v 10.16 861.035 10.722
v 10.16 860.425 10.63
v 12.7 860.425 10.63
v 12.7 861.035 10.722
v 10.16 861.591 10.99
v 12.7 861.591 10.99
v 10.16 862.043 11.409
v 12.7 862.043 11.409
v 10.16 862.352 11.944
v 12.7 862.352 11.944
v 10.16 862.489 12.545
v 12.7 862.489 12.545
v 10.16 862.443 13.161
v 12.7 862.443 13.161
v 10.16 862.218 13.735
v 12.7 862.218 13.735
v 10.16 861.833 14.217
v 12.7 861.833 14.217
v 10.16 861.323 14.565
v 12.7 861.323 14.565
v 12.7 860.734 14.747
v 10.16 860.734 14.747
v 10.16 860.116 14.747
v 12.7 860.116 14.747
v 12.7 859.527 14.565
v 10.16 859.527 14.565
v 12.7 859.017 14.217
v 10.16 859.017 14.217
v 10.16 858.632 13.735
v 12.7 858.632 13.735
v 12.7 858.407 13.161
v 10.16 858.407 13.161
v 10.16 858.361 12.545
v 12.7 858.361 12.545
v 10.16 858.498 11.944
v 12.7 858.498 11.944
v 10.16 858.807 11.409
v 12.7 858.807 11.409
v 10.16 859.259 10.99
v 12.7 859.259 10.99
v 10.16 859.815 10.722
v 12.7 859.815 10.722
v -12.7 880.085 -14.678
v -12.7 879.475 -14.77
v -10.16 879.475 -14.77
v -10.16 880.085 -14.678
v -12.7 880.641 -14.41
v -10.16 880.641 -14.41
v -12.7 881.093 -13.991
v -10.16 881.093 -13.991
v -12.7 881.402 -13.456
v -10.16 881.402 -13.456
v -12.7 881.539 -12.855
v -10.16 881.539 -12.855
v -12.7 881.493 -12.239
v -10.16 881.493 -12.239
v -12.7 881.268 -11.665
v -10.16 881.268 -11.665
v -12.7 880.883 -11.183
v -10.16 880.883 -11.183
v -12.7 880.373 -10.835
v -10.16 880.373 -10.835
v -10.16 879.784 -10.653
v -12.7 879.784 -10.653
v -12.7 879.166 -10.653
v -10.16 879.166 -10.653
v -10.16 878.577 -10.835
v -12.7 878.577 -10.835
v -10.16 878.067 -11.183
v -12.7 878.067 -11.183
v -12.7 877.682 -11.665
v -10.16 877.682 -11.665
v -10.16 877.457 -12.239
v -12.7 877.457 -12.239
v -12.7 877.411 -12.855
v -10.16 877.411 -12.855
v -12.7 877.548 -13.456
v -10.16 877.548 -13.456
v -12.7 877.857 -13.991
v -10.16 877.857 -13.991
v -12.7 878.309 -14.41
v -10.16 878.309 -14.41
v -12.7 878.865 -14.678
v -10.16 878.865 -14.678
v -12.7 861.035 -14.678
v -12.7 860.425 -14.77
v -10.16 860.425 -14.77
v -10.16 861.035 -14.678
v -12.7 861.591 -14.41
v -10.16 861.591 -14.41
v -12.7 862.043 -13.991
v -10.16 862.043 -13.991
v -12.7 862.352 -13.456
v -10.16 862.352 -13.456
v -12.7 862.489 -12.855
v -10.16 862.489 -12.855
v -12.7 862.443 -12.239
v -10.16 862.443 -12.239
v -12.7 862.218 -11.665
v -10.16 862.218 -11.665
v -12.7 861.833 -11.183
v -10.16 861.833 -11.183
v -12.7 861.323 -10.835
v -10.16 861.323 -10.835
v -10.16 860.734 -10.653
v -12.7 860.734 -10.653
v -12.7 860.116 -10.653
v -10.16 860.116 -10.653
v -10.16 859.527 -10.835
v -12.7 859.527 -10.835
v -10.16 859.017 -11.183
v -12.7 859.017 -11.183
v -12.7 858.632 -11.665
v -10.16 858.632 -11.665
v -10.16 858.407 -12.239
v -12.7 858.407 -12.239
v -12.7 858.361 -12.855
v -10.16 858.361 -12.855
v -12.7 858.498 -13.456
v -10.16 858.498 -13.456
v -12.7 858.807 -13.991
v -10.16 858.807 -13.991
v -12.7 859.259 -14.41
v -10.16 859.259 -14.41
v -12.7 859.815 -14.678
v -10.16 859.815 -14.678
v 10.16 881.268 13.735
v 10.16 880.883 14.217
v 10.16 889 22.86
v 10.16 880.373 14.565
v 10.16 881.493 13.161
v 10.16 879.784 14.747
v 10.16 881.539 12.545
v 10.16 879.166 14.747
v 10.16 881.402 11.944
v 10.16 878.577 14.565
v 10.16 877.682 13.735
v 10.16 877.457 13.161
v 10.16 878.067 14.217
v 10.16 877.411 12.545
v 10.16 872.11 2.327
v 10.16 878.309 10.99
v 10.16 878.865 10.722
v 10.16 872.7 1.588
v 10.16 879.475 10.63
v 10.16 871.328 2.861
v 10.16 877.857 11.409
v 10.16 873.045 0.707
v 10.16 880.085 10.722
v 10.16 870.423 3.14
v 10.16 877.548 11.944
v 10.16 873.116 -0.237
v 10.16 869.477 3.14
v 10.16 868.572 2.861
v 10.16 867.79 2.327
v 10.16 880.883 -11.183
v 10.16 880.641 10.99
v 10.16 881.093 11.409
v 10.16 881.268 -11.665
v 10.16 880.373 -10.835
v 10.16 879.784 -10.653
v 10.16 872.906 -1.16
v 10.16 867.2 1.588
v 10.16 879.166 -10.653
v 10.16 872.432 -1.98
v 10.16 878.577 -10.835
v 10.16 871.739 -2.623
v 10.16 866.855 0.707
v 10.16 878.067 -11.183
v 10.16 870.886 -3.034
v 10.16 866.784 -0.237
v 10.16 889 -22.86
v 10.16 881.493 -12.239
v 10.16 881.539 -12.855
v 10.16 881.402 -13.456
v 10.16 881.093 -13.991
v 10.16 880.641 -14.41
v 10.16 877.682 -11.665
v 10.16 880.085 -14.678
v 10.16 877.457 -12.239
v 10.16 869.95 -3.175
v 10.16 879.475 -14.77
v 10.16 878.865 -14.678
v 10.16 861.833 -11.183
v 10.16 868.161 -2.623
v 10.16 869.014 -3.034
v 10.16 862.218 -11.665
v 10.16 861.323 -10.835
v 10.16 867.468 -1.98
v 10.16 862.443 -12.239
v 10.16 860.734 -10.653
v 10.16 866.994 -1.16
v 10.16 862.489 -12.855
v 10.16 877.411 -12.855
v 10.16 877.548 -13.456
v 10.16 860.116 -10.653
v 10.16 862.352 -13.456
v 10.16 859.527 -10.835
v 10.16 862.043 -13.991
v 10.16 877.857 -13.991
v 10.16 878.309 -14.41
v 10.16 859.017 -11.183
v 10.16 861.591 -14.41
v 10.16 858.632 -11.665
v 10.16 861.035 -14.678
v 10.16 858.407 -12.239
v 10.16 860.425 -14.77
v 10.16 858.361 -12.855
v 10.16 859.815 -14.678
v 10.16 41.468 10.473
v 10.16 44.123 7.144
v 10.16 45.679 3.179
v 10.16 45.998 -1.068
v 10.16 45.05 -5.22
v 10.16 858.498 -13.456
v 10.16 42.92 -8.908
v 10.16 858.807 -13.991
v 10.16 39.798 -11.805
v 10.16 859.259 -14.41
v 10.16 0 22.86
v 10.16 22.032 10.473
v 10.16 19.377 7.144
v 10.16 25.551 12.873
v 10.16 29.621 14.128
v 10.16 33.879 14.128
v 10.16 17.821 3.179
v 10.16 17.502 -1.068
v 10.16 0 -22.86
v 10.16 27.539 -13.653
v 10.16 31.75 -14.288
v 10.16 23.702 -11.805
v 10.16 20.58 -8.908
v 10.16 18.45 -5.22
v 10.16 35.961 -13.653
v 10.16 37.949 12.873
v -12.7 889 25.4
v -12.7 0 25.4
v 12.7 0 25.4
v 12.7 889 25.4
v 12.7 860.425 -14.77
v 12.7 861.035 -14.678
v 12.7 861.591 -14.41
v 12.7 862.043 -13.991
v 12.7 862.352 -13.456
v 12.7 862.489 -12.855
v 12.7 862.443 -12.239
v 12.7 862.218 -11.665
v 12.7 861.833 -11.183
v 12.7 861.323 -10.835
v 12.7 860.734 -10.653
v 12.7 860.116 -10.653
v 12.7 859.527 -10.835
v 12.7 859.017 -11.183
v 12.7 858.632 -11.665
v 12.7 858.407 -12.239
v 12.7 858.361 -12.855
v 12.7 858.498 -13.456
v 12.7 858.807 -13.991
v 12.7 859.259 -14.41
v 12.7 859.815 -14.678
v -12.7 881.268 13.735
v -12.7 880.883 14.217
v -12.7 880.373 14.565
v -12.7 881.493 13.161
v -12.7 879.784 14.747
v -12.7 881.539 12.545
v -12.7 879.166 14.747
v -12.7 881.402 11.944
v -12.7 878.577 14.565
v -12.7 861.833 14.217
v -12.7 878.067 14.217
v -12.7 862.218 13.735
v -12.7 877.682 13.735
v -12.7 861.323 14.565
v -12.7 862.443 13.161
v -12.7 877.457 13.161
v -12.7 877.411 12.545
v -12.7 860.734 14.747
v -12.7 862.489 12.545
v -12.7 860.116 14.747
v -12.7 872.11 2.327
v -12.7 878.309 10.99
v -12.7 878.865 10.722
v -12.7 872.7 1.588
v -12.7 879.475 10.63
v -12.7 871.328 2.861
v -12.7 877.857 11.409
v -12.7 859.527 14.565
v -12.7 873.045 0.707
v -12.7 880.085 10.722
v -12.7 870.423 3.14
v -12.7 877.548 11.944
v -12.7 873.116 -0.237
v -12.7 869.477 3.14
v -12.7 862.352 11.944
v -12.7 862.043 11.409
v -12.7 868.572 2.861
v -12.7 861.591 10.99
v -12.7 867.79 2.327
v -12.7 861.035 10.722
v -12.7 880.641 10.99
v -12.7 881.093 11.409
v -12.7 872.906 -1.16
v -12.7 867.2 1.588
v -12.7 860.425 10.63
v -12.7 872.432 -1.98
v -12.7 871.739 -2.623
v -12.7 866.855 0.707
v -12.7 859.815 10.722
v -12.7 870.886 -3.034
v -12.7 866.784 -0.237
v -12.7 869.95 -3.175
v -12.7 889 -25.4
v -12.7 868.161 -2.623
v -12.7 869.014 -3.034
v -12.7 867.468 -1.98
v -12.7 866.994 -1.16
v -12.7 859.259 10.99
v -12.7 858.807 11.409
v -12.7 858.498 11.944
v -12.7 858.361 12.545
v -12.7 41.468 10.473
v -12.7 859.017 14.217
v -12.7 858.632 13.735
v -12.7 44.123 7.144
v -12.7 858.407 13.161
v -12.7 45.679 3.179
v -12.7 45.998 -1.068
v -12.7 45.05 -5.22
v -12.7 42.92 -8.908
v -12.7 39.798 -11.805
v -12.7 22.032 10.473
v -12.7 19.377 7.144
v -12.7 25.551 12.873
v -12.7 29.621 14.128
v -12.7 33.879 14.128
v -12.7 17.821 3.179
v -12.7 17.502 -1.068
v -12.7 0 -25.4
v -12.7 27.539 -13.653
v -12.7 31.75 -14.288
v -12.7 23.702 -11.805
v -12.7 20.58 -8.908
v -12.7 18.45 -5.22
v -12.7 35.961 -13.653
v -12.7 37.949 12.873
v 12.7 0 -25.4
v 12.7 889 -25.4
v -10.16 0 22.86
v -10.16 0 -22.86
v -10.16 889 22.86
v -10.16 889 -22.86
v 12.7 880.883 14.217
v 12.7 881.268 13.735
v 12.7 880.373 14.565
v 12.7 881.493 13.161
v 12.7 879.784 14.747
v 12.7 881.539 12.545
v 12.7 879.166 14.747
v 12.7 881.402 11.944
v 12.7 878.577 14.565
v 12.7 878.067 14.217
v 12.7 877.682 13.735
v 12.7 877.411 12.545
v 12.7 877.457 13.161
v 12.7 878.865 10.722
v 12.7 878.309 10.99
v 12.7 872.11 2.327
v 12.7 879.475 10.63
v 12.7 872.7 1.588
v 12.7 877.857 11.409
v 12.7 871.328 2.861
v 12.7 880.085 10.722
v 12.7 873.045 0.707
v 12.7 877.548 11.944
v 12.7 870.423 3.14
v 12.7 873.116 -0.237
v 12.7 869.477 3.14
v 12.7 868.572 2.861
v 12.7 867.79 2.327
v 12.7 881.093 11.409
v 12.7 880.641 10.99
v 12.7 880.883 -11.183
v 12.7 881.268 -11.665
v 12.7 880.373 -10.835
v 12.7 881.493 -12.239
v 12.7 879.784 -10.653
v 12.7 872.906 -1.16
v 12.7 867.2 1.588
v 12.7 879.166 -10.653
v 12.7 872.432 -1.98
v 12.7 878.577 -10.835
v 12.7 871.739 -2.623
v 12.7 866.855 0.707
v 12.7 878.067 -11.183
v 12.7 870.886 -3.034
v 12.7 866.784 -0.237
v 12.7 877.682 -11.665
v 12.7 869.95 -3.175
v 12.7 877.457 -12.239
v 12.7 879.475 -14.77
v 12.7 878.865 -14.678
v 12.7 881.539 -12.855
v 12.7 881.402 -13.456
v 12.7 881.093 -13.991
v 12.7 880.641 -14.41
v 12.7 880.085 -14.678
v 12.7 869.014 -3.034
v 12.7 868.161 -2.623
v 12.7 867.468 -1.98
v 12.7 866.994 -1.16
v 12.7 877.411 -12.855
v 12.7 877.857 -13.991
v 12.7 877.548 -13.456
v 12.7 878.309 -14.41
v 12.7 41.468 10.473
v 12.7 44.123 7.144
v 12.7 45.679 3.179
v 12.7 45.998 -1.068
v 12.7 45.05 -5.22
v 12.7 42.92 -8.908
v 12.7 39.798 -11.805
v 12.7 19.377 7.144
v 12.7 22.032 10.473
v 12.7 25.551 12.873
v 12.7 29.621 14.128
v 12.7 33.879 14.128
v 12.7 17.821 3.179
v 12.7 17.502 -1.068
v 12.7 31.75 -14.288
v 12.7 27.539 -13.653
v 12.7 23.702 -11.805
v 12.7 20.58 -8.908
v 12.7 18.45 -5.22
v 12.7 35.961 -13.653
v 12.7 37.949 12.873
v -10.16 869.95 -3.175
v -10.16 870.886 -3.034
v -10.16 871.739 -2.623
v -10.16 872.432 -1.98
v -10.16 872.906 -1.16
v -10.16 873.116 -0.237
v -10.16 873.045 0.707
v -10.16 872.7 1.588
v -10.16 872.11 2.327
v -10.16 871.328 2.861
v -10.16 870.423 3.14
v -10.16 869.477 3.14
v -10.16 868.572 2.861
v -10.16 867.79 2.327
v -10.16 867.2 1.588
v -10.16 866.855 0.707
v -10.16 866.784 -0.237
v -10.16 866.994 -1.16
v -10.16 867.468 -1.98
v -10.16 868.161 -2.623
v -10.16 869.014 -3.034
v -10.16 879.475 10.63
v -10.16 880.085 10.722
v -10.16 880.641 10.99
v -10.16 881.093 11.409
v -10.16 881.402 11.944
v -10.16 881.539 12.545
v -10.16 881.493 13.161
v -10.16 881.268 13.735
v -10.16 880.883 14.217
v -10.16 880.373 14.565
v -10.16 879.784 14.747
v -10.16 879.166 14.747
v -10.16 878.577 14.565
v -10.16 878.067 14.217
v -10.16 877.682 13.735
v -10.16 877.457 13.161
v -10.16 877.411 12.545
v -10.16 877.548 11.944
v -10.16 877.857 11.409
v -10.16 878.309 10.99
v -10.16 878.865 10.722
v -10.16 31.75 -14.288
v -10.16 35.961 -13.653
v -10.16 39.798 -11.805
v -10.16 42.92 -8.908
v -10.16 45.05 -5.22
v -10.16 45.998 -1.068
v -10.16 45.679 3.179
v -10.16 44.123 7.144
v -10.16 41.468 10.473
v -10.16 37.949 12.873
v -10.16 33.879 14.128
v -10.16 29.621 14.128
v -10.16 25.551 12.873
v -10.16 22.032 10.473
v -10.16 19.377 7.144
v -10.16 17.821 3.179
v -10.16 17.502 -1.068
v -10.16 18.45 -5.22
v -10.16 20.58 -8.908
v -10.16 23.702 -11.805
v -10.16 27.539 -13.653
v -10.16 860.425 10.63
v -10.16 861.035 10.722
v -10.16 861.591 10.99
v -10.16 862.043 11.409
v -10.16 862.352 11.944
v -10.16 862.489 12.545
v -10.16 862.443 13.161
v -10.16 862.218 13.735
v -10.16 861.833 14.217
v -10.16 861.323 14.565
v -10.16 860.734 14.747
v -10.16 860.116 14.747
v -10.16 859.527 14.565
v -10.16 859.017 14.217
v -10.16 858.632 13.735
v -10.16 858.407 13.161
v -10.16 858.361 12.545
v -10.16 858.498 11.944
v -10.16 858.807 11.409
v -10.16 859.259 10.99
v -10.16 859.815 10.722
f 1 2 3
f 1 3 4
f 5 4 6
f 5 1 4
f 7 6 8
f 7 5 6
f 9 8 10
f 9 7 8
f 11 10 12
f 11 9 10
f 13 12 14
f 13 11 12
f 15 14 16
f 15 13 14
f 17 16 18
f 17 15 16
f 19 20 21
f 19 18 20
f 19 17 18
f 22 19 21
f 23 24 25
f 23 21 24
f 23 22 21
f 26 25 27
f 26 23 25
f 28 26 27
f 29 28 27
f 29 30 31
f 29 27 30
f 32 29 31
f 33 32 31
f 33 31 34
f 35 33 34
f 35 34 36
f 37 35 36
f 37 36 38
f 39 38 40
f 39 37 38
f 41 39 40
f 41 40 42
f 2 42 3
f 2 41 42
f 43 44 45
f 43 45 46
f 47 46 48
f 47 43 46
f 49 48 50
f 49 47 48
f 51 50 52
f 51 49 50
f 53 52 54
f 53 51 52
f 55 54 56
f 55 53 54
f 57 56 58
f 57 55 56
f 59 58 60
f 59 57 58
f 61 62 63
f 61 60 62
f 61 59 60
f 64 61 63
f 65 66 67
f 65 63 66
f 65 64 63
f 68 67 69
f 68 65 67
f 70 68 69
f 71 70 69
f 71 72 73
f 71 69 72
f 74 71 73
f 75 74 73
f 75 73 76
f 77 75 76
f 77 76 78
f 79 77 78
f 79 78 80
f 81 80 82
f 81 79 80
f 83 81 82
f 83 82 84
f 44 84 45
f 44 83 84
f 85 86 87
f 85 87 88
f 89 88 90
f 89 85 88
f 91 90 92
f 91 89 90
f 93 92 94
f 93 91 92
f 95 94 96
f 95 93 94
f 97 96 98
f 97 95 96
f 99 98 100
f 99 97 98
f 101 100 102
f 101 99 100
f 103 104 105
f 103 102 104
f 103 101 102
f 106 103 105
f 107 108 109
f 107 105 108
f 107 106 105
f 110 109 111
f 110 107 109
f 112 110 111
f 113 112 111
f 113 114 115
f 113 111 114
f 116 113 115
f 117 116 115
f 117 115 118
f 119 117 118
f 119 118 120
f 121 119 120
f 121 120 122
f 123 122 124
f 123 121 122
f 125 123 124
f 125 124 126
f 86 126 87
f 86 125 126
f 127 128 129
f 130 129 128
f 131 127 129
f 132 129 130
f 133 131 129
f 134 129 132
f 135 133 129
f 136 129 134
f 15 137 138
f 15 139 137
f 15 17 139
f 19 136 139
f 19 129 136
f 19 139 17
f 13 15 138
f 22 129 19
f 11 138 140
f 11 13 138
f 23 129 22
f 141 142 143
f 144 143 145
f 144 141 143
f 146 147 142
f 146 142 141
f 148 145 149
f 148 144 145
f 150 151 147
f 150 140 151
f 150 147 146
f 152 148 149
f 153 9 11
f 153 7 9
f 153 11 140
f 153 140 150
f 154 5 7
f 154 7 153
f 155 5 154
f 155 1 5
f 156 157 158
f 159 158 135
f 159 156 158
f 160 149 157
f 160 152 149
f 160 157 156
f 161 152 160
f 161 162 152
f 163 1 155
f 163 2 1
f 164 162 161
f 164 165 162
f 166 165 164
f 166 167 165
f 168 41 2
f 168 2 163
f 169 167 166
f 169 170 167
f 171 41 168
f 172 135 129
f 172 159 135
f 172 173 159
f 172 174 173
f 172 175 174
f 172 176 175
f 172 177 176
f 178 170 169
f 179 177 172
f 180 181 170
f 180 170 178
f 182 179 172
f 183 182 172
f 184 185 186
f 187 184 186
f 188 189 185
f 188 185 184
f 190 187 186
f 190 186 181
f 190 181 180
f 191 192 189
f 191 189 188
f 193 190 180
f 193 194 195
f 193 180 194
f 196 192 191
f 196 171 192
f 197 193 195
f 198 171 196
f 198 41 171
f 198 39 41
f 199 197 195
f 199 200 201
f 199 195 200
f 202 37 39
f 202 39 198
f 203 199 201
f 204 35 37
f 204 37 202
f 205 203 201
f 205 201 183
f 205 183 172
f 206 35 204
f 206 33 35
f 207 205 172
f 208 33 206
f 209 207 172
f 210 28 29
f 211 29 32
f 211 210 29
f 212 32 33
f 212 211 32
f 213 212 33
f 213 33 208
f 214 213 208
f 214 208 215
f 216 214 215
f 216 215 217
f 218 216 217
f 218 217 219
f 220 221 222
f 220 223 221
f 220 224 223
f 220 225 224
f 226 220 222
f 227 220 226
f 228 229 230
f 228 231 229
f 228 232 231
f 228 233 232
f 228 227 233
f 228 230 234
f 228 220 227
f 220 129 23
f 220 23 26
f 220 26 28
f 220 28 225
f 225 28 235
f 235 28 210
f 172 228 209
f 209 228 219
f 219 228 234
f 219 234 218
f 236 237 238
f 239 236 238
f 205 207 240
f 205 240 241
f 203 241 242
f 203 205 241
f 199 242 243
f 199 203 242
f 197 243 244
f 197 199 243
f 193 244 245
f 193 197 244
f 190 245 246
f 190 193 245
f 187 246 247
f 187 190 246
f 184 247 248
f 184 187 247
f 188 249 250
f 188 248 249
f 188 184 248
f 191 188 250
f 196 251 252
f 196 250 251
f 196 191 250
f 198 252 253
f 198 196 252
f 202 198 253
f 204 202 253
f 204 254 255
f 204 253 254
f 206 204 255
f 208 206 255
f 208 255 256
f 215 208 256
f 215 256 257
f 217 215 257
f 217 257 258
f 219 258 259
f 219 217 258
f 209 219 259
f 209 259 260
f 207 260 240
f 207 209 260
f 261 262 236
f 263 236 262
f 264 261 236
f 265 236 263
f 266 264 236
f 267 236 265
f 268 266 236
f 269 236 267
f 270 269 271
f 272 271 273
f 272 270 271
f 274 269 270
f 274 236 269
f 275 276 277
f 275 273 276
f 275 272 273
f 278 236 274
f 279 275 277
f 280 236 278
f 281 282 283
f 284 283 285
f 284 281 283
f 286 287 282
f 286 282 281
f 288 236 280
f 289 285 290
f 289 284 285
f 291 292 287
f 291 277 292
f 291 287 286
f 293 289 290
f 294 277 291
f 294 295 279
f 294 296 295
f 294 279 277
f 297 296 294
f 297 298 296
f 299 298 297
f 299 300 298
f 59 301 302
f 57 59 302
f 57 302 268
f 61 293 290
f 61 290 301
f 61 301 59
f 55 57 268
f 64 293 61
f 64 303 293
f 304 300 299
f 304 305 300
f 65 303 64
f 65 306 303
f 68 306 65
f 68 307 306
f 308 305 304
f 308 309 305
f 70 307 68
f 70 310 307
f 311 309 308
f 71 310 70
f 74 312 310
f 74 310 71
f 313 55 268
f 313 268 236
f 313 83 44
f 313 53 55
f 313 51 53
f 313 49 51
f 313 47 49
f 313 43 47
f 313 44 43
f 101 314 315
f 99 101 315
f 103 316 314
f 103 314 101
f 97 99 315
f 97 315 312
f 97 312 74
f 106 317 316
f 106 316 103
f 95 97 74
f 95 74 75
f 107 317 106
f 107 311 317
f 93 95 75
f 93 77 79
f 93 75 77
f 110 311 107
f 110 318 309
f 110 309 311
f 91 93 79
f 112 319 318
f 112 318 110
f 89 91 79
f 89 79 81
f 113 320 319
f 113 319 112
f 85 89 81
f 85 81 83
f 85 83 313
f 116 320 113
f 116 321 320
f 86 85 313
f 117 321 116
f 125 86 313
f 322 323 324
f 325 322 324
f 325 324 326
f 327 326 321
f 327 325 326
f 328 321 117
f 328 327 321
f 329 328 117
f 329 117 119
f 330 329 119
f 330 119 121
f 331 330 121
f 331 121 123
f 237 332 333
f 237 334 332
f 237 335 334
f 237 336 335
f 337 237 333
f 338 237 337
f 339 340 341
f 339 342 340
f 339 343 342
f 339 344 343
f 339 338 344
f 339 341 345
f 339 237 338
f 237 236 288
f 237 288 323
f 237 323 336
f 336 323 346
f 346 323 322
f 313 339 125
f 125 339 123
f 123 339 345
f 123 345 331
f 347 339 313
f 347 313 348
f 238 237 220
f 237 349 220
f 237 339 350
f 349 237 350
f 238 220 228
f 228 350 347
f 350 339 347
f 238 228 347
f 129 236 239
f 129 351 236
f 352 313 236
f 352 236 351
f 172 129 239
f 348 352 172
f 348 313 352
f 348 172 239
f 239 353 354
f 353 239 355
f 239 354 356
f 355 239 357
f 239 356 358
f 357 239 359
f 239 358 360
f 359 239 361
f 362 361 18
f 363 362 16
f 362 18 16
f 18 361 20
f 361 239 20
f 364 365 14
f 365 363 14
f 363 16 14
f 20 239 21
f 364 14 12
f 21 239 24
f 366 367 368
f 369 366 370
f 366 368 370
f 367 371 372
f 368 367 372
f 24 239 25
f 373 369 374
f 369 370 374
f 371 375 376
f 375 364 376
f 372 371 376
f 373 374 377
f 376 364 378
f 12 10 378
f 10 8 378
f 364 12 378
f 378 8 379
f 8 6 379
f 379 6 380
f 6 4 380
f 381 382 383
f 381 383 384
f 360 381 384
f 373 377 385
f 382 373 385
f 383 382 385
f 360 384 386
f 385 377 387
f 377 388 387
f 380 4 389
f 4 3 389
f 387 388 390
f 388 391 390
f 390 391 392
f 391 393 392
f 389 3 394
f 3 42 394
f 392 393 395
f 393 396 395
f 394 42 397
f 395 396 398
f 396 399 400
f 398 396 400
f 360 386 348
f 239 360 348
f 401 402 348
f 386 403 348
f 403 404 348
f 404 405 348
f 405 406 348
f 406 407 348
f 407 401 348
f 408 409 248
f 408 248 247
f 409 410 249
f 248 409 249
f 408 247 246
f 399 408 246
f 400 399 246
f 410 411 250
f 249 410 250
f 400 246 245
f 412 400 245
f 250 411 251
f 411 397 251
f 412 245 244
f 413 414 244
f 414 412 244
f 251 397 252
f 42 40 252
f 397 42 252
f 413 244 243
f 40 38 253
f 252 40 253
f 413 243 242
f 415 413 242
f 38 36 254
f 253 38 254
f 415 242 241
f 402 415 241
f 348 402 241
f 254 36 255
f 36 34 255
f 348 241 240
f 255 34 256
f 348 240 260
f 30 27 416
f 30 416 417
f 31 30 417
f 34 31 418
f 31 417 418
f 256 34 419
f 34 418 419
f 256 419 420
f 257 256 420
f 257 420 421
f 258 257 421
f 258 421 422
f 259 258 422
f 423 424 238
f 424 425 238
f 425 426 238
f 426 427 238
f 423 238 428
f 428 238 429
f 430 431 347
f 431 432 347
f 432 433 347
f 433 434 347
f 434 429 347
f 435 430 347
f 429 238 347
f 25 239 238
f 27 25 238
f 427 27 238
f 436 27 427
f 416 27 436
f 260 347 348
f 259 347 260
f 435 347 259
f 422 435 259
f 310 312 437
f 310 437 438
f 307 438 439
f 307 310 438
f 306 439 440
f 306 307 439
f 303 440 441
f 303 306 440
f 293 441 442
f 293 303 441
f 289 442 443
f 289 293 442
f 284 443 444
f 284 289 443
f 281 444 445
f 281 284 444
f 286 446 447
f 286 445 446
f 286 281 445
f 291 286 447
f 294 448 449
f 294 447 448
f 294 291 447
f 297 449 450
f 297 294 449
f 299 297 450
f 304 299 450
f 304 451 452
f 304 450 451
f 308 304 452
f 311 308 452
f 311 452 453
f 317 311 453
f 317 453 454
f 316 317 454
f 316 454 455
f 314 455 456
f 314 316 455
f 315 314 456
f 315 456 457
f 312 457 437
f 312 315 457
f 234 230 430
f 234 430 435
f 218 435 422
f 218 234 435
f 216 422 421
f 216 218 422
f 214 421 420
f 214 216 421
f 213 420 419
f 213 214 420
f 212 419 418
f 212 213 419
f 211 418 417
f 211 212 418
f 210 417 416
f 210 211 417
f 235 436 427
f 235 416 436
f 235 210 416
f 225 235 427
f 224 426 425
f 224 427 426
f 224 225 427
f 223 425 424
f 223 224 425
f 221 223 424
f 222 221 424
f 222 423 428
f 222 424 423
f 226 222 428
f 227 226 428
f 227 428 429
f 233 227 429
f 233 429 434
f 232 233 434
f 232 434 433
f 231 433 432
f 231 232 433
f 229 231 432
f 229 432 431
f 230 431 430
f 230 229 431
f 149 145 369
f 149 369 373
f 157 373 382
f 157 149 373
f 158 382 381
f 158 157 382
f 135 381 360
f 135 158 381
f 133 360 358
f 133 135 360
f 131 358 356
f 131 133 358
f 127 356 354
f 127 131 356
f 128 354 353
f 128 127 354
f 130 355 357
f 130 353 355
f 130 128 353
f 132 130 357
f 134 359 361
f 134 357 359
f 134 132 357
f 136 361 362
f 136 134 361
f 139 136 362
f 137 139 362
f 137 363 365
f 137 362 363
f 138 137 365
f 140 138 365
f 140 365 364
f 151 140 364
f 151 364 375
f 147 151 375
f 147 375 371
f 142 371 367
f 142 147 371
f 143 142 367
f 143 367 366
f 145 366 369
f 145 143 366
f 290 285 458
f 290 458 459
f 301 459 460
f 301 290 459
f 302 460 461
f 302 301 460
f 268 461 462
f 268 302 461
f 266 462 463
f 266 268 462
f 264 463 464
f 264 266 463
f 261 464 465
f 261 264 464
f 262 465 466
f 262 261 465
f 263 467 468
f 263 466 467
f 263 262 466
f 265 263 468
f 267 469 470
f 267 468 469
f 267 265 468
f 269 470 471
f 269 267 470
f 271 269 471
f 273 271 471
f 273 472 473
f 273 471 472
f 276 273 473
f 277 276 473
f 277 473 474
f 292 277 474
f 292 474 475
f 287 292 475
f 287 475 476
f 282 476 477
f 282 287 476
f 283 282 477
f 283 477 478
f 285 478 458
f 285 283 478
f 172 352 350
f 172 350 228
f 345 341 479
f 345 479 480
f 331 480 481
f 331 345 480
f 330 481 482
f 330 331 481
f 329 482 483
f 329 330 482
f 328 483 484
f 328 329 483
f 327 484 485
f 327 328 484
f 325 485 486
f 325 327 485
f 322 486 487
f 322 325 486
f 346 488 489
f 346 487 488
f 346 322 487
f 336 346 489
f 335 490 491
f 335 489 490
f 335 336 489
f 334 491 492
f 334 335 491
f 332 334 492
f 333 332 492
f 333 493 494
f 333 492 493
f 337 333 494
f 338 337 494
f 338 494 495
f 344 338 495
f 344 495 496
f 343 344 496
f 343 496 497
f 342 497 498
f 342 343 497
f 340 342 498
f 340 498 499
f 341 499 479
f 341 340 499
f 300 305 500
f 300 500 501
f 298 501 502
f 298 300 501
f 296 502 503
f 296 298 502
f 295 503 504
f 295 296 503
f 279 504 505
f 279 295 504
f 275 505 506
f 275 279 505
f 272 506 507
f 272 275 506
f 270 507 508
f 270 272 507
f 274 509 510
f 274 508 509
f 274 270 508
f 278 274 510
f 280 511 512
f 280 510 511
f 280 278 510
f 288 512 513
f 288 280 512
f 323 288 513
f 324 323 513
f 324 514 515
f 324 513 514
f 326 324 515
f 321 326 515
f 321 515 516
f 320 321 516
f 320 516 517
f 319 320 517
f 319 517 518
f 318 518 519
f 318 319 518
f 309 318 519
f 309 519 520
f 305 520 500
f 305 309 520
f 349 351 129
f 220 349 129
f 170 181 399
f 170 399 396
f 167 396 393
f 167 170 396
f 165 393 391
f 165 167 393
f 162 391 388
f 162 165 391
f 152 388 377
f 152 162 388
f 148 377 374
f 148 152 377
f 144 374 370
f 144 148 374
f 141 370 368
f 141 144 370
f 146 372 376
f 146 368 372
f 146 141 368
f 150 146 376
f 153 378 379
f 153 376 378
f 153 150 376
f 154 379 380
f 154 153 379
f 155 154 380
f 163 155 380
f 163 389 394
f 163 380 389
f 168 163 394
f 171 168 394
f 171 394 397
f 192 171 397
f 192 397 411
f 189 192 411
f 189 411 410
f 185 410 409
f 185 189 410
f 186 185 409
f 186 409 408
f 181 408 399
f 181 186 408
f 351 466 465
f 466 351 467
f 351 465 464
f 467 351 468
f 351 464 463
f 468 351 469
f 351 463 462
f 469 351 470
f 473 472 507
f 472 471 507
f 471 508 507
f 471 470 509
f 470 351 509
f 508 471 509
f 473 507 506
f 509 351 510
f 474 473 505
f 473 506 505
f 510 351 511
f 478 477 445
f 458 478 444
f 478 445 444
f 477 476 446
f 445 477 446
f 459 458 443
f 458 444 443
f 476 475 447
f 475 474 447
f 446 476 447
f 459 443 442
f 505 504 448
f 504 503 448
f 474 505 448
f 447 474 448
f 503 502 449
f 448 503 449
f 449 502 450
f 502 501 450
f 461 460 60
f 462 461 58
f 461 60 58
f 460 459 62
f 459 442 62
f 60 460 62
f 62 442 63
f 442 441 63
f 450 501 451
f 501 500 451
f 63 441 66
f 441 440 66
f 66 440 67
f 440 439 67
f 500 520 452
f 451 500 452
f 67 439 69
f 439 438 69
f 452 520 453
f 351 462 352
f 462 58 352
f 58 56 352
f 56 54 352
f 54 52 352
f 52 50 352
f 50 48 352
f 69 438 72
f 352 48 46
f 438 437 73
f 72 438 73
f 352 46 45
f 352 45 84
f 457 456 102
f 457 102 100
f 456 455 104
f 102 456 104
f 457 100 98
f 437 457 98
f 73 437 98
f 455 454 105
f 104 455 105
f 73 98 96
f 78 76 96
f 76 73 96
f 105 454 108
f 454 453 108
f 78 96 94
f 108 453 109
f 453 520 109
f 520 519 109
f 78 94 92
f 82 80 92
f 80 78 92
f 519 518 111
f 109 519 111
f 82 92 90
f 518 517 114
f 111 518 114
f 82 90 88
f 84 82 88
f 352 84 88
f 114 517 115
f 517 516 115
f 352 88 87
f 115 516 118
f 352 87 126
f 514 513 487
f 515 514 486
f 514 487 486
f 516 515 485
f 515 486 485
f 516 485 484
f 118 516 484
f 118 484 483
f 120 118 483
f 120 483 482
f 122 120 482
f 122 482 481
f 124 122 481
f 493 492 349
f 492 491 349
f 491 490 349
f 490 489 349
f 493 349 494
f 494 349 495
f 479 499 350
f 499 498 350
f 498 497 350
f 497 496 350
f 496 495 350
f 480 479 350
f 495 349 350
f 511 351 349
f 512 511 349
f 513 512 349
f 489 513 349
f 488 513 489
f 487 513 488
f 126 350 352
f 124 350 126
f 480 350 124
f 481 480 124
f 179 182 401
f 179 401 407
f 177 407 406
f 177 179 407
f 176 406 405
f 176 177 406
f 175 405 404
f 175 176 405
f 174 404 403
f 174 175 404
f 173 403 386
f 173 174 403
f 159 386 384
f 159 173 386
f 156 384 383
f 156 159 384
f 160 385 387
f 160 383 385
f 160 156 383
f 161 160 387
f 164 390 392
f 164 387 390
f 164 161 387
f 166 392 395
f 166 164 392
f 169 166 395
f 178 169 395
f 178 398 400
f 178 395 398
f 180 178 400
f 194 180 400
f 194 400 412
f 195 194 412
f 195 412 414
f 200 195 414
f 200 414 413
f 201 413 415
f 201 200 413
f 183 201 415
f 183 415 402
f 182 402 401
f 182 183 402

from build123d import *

# Parameters (mm, degrees)
SKETCH1_W                                 = 25.4
SKETCH1_H                                 = 50.8
SKETCH1_W_2                               = 20.32
SKETCH1_H_2                               = 45.72
VERSAFRAME_VERSAFRAME_2_X_1_X_0_1_1_DEPTH = 889
CUT_EXTRUDE1_DEPTH                        = 890.725418317
CUT_EXTRUDE1_DEPTH_BACK                   = 890.725418317
SKETCH2_R                                 = 14.2875
CUT_EXTRUDE2_DEPTH                        = 890.725418317
CUT_EXTRUDE2_DEPTH_BACK                   = 890.725418317
SKETCH3_R                                 = 2.07
SKETCH3_R_2                               = 3.175


with BuildPart() as part:
    # Sketch1 → Versaframe VERSAFRAME 2 X 1 X 0.1 (1) (new body)
    with BuildSketch(Plane(origin=(0, 0, 0), x_dir=(1, 0, 0), z_dir=(0, 1, 0))):
        Rectangle(SKETCH1_W, SKETCH1_H)
        Rectangle(SKETCH1_W_2, SKETCH1_H_2, mode=Mode.SUBTRACT)
    extrude(amount=VERSAFRAME_VERSAFRAME_2_X_1_X_0_1_1_DEPTH)

    # Sketch2 → Cut-Extrude1 (cut, two sides: drawn at the far end of the back side and taken through both)
    with BuildSketch(Plane(origin=(12.7, 0, 0), x_dir=(0, 0, -1), z_dir=(1, 0, 0)).offset(-CUT_EXTRUDE1_DEPTH_BACK)):
        with Locations((0, 31.75)):
            Circle(SKETCH2_R)
    extrude(amount=CUT_EXTRUDE1_DEPTH + CUT_EXTRUDE1_DEPTH_BACK, mode=Mode.SUBTRACT)

    # Sketch3 → Cut-Extrude2 (cut, two sides: drawn at the far end of the back side and taken through both)
    with BuildSketch(Plane(origin=(12.7, 0, 0), x_dir=(0, 0, -1), z_dir=(1, 0, 0)).offset(-CUT_EXTRUDE2_DEPTH_BACK)):
        with Locations((-12.7, 879.475)):
            Circle(SKETCH3_R)
        with Locations((-12.7, 860.425)):
            Circle(SKETCH3_R)
        with Locations((0, 869.95)):
            Circle(SKETCH3_R_2)
        with Locations((12.7, 860.425)):
            Circle(SKETCH3_R)
        with Locations((12.7, 879.475)):
            Circle(SKETCH3_R)
    extrude(amount=CUT_EXTRUDE2_DEPTH + CUT_EXTRUDE2_DEPTH_BACK, mode=Mode.SUBTRACT)


solid = part.part
